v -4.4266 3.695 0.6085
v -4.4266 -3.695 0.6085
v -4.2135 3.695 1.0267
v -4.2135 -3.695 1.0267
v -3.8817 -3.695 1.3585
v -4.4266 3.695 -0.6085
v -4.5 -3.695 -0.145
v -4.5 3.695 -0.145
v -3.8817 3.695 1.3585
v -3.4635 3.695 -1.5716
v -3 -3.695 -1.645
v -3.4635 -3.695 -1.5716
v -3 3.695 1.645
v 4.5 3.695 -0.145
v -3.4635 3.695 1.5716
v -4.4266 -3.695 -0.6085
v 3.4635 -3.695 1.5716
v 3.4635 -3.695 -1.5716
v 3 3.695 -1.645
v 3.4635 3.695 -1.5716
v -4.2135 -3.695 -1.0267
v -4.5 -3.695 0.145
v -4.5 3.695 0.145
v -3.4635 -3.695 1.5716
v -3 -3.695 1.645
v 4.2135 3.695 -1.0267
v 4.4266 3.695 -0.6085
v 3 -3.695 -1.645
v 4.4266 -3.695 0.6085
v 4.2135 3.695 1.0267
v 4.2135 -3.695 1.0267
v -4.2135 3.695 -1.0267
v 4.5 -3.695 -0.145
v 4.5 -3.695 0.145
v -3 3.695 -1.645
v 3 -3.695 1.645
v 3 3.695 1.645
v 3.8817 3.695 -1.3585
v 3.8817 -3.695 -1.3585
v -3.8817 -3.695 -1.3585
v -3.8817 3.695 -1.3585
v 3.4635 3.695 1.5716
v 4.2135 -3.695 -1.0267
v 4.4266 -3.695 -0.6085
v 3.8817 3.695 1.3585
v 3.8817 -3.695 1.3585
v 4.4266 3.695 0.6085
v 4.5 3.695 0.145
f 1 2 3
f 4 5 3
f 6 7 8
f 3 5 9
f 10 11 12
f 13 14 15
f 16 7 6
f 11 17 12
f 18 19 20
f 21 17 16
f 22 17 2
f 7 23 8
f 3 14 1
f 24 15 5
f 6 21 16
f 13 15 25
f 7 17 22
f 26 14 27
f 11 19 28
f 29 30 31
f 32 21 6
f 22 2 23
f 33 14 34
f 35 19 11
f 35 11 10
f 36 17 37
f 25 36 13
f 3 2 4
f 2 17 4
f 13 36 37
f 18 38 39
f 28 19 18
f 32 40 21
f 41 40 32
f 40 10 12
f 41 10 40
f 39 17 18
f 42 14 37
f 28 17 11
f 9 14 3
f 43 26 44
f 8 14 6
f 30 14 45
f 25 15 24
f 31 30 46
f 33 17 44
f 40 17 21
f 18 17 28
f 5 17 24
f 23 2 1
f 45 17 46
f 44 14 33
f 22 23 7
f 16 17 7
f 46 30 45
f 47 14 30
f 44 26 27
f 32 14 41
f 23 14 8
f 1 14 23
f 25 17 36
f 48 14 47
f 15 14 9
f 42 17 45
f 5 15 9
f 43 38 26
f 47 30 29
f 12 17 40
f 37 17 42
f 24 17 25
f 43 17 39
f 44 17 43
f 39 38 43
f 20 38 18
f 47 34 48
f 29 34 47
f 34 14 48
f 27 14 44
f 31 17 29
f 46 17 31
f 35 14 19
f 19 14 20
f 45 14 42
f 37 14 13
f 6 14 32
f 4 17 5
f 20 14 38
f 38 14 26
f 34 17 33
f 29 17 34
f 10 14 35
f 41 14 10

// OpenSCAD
// file: ../assets/usb-charger/configurations.scad
usb_charger_asset_electronic_card_x_size = 17.57;
usb_charger_asset_electronic_card_y_size = 27.85;
usb_charger_asset_electronic_card_z_size = 0.87;
usb_charger_asset_usb_port_x_size = 9;
usb_charger_asset_usb_port_y_size = 7.39;
usb_charger_asset_usb_port_z_size = 3.29;
usb_charger_asset_usb_round_radius = 1.5;
usb_charger_asset_draw_rounded_usb = true;
usb_charger_asset_usb_port_x_offset = 4.5;
usb_charger_asset_usb_port_y_offset = -1.36;
usb_charger_asset_fn = 20;
// main file
include <../assets/usb-charger/configurations.scad>

/**
 * usbCConnectorEnveloppe
 * @name usbCConnectorEnveloppe
 * @description usbCConnectorEnveloppe
 * @type enveloppe
 * @parent root
 */
module usbCConnectorEnveloppe(
    usb_port_x_size = usb_charger_asset_usb_port_x_size,
    usb_port_y_size = usb_charger_asset_usb_port_y_size,
    usb_port_z_size = usb_charger_asset_usb_port_z_size,
    usb_round_radius = usb_charger_asset_usb_round_radius,
    _fn = usb_charger_asset_fn
) {

    usb_edges_coords = [
        [
            usb_round_radius,
            usb_round_radius
        ],
        [
            usb_port_x_size - usb_round_radius,
            usb_round_radius
        ],
        [
            usb_port_x_size - usb_round_radius,
            usb_port_z_size - usb_round_radius
        ],
        [
            usb_round_radius,
            usb_port_z_size - usb_round_radius
        ],
    ];

    translate([-usb_port_x_size / 2, -usb_port_y_size / 2, -usb_port_z_size / 2])
    hull() {
        for (edge = usb_edges_coords) {
            translate([edge[0], 0, edge[1]])
                rotate([-90,0,0])
                    cylinder(h = usb_port_y_size, r = usb_round_radius, $fn = _fn);
        }
    }
}


usbCConnectorEnveloppe();
